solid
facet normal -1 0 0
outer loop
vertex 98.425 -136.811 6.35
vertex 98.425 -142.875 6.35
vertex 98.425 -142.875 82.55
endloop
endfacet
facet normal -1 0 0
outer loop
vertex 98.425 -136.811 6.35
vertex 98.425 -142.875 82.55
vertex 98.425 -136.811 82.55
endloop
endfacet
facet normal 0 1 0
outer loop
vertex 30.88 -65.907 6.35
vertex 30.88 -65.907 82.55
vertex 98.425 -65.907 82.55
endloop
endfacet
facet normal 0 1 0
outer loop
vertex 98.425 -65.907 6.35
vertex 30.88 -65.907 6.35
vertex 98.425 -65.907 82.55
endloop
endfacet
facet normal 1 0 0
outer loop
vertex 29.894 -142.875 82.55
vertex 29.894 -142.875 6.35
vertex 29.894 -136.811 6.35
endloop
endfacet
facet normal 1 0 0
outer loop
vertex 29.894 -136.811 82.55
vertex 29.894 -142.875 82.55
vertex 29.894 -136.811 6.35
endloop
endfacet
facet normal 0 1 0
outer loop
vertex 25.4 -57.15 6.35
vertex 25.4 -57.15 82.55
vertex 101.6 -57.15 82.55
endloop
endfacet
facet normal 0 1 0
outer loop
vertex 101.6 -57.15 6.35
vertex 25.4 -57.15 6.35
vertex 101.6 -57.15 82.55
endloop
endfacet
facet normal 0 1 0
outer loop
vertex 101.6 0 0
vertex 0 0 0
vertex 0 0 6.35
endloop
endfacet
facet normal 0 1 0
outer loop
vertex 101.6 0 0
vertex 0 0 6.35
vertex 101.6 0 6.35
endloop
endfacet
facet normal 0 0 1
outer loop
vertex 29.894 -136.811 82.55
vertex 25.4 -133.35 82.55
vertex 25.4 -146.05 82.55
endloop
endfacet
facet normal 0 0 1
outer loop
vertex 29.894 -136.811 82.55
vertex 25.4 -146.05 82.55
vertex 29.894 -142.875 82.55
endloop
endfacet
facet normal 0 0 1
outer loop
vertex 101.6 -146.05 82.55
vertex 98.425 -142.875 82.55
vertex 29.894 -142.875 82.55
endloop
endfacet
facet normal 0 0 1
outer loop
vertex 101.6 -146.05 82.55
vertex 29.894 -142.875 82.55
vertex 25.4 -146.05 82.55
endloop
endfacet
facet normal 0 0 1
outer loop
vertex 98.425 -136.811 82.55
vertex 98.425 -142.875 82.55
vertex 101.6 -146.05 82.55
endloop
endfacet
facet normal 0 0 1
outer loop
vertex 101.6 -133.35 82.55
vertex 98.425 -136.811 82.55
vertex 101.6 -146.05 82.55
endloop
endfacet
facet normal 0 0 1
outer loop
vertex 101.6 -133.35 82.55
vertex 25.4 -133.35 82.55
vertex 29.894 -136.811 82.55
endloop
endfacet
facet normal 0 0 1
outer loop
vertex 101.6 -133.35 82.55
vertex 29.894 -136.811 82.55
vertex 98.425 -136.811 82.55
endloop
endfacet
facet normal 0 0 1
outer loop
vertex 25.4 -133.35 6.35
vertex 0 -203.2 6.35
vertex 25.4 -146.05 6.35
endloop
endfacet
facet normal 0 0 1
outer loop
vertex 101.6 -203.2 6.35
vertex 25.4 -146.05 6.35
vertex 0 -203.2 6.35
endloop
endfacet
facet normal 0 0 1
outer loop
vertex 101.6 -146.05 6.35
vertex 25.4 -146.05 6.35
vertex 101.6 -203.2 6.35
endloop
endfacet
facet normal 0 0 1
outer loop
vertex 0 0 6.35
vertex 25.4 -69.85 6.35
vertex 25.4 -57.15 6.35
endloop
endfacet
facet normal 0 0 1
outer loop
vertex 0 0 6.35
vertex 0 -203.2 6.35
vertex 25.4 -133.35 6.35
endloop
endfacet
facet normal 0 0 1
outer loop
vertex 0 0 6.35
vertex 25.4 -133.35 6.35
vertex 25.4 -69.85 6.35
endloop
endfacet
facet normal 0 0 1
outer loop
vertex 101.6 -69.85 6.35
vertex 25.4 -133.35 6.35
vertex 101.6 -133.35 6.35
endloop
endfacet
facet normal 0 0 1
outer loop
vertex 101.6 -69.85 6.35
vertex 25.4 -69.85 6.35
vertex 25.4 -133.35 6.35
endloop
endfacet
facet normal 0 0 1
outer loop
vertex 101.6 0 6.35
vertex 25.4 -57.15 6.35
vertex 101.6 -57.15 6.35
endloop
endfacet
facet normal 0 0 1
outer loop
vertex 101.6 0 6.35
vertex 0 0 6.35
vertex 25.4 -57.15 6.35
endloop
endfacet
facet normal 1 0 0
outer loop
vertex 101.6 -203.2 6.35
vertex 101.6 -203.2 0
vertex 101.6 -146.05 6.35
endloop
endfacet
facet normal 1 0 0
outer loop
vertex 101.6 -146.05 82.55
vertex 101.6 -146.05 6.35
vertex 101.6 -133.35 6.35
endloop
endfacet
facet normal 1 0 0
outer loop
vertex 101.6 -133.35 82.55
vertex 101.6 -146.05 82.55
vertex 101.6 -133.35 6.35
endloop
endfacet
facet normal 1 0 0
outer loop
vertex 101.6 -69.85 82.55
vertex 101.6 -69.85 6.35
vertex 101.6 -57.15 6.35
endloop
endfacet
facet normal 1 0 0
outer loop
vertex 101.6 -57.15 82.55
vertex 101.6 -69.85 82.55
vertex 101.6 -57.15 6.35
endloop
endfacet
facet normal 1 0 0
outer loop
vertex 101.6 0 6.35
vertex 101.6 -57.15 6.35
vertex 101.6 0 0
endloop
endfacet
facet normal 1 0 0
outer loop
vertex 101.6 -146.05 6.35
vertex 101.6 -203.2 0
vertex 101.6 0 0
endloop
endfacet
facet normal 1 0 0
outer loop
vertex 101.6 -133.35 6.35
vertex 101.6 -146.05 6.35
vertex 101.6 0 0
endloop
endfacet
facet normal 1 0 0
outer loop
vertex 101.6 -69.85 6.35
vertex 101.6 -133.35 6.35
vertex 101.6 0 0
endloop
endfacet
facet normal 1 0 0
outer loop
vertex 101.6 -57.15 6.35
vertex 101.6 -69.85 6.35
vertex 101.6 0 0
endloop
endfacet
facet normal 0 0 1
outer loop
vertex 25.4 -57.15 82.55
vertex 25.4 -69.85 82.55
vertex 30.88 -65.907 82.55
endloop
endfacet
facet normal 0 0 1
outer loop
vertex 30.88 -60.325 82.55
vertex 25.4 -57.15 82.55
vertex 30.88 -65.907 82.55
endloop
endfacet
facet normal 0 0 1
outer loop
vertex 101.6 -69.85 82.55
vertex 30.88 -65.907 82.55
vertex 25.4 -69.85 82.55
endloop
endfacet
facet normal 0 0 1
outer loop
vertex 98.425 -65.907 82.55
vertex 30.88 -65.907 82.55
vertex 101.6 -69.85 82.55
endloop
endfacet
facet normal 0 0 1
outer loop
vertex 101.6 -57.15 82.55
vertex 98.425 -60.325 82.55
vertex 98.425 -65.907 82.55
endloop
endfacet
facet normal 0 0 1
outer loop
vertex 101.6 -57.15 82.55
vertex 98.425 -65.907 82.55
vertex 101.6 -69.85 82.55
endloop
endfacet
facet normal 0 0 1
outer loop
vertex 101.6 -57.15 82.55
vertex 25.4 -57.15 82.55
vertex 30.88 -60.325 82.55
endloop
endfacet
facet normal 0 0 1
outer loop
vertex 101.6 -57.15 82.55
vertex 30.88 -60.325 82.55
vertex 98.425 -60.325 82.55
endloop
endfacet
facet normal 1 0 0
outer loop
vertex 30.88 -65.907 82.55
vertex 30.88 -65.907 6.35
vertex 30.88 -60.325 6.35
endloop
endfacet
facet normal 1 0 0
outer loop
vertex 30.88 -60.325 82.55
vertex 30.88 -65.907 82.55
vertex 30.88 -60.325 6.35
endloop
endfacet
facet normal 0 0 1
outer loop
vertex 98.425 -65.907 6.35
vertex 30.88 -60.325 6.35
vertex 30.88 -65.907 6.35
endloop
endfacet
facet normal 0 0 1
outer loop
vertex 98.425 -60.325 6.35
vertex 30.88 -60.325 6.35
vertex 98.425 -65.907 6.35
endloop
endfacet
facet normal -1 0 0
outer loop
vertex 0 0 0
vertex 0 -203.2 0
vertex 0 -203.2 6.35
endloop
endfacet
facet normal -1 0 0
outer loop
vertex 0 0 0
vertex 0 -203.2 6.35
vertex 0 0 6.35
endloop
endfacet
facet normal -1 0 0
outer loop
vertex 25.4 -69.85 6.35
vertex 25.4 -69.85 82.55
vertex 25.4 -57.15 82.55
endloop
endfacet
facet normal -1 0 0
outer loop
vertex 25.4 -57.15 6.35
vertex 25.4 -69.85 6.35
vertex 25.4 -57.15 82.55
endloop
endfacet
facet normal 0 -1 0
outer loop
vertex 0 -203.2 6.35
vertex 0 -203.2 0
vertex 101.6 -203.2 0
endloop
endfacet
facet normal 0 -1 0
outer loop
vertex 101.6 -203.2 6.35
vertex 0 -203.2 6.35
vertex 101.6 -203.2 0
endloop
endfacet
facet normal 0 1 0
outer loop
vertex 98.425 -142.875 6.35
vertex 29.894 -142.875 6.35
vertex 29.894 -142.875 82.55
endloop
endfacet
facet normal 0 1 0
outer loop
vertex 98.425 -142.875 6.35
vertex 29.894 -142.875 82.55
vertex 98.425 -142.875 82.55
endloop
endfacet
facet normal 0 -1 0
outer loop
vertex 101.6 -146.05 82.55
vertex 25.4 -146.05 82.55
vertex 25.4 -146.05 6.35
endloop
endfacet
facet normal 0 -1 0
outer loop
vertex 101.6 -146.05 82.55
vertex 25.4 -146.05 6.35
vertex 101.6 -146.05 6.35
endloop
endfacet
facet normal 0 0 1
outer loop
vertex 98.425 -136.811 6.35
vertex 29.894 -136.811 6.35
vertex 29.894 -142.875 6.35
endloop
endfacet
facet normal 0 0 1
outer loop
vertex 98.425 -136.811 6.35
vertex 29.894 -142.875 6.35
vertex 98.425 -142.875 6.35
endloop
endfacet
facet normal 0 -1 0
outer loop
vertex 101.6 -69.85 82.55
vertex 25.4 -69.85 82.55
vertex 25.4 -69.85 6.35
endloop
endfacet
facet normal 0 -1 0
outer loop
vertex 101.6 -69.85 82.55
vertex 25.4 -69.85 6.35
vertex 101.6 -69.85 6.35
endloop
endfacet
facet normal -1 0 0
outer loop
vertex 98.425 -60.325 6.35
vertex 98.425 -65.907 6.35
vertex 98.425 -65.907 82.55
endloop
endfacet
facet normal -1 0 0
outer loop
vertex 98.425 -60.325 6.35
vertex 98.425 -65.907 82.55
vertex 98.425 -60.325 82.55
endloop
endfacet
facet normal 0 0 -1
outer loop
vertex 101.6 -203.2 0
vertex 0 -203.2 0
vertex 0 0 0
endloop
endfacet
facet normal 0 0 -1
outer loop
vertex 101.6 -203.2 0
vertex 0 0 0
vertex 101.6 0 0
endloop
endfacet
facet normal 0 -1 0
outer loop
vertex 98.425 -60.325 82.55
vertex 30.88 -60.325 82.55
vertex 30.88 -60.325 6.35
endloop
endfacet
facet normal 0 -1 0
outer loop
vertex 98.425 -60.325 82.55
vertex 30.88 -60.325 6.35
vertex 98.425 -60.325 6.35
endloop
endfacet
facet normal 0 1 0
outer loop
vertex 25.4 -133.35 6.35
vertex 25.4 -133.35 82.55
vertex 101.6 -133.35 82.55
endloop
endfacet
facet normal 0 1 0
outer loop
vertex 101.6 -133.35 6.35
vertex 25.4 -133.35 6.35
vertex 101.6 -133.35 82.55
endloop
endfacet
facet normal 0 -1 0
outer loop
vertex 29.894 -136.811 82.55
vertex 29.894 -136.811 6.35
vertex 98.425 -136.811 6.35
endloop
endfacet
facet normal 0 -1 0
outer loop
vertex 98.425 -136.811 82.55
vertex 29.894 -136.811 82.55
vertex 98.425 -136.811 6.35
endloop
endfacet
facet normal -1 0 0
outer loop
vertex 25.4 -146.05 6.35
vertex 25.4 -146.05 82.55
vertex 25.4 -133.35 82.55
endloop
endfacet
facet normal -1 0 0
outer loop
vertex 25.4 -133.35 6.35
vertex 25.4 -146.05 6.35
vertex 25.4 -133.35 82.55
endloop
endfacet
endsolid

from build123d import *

# Parameters (mm, degrees)
F0_W     = 101.6
F0_H     = 203.2
F1_DEPTH = 6.35
F2_W     = 76.2
F2_H     = 12.7
F2_W_2   = 67.544904
F2_H_2   = 5.582169
F2_W_3   = 68.530646
F2_H_3   = 6.063819
F3_DEPTH = 76.2


with BuildPart() as f1:
    # F0 (on Top) → F1 (new body)
    with BuildSketch(Plane.XY):
        with Locations((50.8, -101.6)):
            Rectangle(F0_W, F0_H)
    extrude(amount=F1_DEPTH)

    # F2 (on face) → F3 (join)
    with BuildSketch(Plane.XY.offset(6.35)):
        with Locations((63.5, -63.5)):
            Rectangle(F2_W, F2_H)
        with Locations((64.652548, -63.116084)):
            Rectangle(F2_W_2, F2_H_2, mode=Mode.SUBTRACT)
        with Locations((63.5, -139.7)):
            Rectangle(F2_W, F2_H)
        with Locations((64.159677, -139.843091)):
            Rectangle(F2_W_3, F2_H_3, mode=Mode.SUBTRACT)
    extrude(amount=F3_DEPTH)


solid = f1.part
